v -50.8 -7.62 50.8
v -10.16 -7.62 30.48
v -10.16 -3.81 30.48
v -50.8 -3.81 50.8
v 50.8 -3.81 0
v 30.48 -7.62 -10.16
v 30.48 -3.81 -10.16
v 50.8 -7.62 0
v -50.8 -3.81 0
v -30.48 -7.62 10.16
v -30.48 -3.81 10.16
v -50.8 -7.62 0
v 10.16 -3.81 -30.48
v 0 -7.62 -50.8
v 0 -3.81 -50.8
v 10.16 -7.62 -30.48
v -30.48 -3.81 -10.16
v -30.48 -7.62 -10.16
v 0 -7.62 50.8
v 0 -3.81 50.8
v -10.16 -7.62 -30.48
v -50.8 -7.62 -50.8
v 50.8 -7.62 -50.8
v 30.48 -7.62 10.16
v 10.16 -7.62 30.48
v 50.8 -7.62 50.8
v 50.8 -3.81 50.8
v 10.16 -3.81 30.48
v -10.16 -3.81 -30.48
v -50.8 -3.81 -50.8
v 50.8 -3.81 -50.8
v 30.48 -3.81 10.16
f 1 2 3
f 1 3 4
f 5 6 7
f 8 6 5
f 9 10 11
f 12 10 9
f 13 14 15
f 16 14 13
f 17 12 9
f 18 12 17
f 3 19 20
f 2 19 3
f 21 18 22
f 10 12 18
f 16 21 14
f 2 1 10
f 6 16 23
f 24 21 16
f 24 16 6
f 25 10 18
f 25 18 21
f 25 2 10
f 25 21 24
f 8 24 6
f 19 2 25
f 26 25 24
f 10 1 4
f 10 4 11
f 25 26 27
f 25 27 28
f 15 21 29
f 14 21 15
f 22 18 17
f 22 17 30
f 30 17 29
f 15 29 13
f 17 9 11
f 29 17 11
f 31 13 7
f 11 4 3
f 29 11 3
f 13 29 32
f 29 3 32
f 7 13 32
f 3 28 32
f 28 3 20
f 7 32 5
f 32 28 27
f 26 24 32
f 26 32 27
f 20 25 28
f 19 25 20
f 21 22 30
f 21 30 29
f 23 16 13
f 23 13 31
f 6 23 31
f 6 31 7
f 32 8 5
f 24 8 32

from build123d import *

# Parameters (mm, degrees)
F0_W     = 101.6
F0_H     = 101.6
F1_DEPTH = 7.62
F3_DEPTH = 3.81


with BuildPart() as f1:
    # F0 (on Front) → F1 (new body)
    with BuildSketch(Plane.XZ):
        Rectangle(F0_W, F0_H)
    extrude(amount=F1_DEPTH)

    # F2 (on face) → F3 (intersect)
    with BuildSketch(Plane.XZ.offset(7.62)):
        Polygon((-16.9333333333, 16.9333333333), (-10.16, 30.48), (-50.8, 50.8), (-30.48, 10.16), align=None)
        Polygon((10.16, 30.48), (0, 50.8), (-10.16, 30.48), (0, 25.4), align=None)
        Polygon((0, 25.4), (-10.16, 30.48), (-16.9333333333, 16.9333333333), align=None)
        Polygon((16.9333333333, 16.9333333333), (10.16, 30.48), (0, 25.4), align=None)
        Polygon((50.8, 50.8), (10.16, 30.48), (16.9333333333, 16.9333333333), (30.48, 10.16), align=None)
        Polygon((50.8, 0), (30.48, 10.16), (25.4, 0), (30.48, -10.16), align=None)
        Polygon((50.8, -50.8), (30.48, -10.16), (16.9333333333, -16.9333333333), (10.16, -30.48), align=None)
        Polygon((-10.16, -30.48), (0, -50.8), (10.16, -30.48), (0, -25.4), align=None)
        Polygon((-16.9333333333, -16.9333333333), (-30.48, -10.16), (-50.8, -50.8), (-10.16, -30.48), align=None)
        Polygon((-25.4, 0), (-30.48, 10.16), (-50.8, 0), (-30.48, -10.16), align=None)
        Polygon((-25.4, 0), (-16.9333333333, 16.9333333333), (-30.48, 10.16), align=None)
        Polygon((0, 25.4), (-16.9333333333, 16.9333333333), (-25.4, 0), (-16.9333333333, -16.9333333333), (0, -25.4), (16.9333333333, -16.9333333333), (25.4, 0), (16.9333333333, 16.9333333333), align=None)
        Polygon((10.16, -30.48), (16.9333333333, -16.9333333333), (0, -25.4), align=None)
        Polygon((30.48, -10.16), (25.4, 0), (16.9333333333, -16.9333333333), align=None)
        Polygon((30.48, 10.16), (16.9333333333, 16.9333333333), (25.4, 0), align=None)
        Polygon((-16.9333333333, -16.9333333333), (-25.4, 0), (-30.48, -10.16), align=None)
        Polygon((0, -25.4), (-16.9333333333, -16.9333333333), (-10.16, -30.48), align=None)
    extrude(amount=-F3_DEPTH, mode=Mode.INTERSECT)


solid = f1.part
